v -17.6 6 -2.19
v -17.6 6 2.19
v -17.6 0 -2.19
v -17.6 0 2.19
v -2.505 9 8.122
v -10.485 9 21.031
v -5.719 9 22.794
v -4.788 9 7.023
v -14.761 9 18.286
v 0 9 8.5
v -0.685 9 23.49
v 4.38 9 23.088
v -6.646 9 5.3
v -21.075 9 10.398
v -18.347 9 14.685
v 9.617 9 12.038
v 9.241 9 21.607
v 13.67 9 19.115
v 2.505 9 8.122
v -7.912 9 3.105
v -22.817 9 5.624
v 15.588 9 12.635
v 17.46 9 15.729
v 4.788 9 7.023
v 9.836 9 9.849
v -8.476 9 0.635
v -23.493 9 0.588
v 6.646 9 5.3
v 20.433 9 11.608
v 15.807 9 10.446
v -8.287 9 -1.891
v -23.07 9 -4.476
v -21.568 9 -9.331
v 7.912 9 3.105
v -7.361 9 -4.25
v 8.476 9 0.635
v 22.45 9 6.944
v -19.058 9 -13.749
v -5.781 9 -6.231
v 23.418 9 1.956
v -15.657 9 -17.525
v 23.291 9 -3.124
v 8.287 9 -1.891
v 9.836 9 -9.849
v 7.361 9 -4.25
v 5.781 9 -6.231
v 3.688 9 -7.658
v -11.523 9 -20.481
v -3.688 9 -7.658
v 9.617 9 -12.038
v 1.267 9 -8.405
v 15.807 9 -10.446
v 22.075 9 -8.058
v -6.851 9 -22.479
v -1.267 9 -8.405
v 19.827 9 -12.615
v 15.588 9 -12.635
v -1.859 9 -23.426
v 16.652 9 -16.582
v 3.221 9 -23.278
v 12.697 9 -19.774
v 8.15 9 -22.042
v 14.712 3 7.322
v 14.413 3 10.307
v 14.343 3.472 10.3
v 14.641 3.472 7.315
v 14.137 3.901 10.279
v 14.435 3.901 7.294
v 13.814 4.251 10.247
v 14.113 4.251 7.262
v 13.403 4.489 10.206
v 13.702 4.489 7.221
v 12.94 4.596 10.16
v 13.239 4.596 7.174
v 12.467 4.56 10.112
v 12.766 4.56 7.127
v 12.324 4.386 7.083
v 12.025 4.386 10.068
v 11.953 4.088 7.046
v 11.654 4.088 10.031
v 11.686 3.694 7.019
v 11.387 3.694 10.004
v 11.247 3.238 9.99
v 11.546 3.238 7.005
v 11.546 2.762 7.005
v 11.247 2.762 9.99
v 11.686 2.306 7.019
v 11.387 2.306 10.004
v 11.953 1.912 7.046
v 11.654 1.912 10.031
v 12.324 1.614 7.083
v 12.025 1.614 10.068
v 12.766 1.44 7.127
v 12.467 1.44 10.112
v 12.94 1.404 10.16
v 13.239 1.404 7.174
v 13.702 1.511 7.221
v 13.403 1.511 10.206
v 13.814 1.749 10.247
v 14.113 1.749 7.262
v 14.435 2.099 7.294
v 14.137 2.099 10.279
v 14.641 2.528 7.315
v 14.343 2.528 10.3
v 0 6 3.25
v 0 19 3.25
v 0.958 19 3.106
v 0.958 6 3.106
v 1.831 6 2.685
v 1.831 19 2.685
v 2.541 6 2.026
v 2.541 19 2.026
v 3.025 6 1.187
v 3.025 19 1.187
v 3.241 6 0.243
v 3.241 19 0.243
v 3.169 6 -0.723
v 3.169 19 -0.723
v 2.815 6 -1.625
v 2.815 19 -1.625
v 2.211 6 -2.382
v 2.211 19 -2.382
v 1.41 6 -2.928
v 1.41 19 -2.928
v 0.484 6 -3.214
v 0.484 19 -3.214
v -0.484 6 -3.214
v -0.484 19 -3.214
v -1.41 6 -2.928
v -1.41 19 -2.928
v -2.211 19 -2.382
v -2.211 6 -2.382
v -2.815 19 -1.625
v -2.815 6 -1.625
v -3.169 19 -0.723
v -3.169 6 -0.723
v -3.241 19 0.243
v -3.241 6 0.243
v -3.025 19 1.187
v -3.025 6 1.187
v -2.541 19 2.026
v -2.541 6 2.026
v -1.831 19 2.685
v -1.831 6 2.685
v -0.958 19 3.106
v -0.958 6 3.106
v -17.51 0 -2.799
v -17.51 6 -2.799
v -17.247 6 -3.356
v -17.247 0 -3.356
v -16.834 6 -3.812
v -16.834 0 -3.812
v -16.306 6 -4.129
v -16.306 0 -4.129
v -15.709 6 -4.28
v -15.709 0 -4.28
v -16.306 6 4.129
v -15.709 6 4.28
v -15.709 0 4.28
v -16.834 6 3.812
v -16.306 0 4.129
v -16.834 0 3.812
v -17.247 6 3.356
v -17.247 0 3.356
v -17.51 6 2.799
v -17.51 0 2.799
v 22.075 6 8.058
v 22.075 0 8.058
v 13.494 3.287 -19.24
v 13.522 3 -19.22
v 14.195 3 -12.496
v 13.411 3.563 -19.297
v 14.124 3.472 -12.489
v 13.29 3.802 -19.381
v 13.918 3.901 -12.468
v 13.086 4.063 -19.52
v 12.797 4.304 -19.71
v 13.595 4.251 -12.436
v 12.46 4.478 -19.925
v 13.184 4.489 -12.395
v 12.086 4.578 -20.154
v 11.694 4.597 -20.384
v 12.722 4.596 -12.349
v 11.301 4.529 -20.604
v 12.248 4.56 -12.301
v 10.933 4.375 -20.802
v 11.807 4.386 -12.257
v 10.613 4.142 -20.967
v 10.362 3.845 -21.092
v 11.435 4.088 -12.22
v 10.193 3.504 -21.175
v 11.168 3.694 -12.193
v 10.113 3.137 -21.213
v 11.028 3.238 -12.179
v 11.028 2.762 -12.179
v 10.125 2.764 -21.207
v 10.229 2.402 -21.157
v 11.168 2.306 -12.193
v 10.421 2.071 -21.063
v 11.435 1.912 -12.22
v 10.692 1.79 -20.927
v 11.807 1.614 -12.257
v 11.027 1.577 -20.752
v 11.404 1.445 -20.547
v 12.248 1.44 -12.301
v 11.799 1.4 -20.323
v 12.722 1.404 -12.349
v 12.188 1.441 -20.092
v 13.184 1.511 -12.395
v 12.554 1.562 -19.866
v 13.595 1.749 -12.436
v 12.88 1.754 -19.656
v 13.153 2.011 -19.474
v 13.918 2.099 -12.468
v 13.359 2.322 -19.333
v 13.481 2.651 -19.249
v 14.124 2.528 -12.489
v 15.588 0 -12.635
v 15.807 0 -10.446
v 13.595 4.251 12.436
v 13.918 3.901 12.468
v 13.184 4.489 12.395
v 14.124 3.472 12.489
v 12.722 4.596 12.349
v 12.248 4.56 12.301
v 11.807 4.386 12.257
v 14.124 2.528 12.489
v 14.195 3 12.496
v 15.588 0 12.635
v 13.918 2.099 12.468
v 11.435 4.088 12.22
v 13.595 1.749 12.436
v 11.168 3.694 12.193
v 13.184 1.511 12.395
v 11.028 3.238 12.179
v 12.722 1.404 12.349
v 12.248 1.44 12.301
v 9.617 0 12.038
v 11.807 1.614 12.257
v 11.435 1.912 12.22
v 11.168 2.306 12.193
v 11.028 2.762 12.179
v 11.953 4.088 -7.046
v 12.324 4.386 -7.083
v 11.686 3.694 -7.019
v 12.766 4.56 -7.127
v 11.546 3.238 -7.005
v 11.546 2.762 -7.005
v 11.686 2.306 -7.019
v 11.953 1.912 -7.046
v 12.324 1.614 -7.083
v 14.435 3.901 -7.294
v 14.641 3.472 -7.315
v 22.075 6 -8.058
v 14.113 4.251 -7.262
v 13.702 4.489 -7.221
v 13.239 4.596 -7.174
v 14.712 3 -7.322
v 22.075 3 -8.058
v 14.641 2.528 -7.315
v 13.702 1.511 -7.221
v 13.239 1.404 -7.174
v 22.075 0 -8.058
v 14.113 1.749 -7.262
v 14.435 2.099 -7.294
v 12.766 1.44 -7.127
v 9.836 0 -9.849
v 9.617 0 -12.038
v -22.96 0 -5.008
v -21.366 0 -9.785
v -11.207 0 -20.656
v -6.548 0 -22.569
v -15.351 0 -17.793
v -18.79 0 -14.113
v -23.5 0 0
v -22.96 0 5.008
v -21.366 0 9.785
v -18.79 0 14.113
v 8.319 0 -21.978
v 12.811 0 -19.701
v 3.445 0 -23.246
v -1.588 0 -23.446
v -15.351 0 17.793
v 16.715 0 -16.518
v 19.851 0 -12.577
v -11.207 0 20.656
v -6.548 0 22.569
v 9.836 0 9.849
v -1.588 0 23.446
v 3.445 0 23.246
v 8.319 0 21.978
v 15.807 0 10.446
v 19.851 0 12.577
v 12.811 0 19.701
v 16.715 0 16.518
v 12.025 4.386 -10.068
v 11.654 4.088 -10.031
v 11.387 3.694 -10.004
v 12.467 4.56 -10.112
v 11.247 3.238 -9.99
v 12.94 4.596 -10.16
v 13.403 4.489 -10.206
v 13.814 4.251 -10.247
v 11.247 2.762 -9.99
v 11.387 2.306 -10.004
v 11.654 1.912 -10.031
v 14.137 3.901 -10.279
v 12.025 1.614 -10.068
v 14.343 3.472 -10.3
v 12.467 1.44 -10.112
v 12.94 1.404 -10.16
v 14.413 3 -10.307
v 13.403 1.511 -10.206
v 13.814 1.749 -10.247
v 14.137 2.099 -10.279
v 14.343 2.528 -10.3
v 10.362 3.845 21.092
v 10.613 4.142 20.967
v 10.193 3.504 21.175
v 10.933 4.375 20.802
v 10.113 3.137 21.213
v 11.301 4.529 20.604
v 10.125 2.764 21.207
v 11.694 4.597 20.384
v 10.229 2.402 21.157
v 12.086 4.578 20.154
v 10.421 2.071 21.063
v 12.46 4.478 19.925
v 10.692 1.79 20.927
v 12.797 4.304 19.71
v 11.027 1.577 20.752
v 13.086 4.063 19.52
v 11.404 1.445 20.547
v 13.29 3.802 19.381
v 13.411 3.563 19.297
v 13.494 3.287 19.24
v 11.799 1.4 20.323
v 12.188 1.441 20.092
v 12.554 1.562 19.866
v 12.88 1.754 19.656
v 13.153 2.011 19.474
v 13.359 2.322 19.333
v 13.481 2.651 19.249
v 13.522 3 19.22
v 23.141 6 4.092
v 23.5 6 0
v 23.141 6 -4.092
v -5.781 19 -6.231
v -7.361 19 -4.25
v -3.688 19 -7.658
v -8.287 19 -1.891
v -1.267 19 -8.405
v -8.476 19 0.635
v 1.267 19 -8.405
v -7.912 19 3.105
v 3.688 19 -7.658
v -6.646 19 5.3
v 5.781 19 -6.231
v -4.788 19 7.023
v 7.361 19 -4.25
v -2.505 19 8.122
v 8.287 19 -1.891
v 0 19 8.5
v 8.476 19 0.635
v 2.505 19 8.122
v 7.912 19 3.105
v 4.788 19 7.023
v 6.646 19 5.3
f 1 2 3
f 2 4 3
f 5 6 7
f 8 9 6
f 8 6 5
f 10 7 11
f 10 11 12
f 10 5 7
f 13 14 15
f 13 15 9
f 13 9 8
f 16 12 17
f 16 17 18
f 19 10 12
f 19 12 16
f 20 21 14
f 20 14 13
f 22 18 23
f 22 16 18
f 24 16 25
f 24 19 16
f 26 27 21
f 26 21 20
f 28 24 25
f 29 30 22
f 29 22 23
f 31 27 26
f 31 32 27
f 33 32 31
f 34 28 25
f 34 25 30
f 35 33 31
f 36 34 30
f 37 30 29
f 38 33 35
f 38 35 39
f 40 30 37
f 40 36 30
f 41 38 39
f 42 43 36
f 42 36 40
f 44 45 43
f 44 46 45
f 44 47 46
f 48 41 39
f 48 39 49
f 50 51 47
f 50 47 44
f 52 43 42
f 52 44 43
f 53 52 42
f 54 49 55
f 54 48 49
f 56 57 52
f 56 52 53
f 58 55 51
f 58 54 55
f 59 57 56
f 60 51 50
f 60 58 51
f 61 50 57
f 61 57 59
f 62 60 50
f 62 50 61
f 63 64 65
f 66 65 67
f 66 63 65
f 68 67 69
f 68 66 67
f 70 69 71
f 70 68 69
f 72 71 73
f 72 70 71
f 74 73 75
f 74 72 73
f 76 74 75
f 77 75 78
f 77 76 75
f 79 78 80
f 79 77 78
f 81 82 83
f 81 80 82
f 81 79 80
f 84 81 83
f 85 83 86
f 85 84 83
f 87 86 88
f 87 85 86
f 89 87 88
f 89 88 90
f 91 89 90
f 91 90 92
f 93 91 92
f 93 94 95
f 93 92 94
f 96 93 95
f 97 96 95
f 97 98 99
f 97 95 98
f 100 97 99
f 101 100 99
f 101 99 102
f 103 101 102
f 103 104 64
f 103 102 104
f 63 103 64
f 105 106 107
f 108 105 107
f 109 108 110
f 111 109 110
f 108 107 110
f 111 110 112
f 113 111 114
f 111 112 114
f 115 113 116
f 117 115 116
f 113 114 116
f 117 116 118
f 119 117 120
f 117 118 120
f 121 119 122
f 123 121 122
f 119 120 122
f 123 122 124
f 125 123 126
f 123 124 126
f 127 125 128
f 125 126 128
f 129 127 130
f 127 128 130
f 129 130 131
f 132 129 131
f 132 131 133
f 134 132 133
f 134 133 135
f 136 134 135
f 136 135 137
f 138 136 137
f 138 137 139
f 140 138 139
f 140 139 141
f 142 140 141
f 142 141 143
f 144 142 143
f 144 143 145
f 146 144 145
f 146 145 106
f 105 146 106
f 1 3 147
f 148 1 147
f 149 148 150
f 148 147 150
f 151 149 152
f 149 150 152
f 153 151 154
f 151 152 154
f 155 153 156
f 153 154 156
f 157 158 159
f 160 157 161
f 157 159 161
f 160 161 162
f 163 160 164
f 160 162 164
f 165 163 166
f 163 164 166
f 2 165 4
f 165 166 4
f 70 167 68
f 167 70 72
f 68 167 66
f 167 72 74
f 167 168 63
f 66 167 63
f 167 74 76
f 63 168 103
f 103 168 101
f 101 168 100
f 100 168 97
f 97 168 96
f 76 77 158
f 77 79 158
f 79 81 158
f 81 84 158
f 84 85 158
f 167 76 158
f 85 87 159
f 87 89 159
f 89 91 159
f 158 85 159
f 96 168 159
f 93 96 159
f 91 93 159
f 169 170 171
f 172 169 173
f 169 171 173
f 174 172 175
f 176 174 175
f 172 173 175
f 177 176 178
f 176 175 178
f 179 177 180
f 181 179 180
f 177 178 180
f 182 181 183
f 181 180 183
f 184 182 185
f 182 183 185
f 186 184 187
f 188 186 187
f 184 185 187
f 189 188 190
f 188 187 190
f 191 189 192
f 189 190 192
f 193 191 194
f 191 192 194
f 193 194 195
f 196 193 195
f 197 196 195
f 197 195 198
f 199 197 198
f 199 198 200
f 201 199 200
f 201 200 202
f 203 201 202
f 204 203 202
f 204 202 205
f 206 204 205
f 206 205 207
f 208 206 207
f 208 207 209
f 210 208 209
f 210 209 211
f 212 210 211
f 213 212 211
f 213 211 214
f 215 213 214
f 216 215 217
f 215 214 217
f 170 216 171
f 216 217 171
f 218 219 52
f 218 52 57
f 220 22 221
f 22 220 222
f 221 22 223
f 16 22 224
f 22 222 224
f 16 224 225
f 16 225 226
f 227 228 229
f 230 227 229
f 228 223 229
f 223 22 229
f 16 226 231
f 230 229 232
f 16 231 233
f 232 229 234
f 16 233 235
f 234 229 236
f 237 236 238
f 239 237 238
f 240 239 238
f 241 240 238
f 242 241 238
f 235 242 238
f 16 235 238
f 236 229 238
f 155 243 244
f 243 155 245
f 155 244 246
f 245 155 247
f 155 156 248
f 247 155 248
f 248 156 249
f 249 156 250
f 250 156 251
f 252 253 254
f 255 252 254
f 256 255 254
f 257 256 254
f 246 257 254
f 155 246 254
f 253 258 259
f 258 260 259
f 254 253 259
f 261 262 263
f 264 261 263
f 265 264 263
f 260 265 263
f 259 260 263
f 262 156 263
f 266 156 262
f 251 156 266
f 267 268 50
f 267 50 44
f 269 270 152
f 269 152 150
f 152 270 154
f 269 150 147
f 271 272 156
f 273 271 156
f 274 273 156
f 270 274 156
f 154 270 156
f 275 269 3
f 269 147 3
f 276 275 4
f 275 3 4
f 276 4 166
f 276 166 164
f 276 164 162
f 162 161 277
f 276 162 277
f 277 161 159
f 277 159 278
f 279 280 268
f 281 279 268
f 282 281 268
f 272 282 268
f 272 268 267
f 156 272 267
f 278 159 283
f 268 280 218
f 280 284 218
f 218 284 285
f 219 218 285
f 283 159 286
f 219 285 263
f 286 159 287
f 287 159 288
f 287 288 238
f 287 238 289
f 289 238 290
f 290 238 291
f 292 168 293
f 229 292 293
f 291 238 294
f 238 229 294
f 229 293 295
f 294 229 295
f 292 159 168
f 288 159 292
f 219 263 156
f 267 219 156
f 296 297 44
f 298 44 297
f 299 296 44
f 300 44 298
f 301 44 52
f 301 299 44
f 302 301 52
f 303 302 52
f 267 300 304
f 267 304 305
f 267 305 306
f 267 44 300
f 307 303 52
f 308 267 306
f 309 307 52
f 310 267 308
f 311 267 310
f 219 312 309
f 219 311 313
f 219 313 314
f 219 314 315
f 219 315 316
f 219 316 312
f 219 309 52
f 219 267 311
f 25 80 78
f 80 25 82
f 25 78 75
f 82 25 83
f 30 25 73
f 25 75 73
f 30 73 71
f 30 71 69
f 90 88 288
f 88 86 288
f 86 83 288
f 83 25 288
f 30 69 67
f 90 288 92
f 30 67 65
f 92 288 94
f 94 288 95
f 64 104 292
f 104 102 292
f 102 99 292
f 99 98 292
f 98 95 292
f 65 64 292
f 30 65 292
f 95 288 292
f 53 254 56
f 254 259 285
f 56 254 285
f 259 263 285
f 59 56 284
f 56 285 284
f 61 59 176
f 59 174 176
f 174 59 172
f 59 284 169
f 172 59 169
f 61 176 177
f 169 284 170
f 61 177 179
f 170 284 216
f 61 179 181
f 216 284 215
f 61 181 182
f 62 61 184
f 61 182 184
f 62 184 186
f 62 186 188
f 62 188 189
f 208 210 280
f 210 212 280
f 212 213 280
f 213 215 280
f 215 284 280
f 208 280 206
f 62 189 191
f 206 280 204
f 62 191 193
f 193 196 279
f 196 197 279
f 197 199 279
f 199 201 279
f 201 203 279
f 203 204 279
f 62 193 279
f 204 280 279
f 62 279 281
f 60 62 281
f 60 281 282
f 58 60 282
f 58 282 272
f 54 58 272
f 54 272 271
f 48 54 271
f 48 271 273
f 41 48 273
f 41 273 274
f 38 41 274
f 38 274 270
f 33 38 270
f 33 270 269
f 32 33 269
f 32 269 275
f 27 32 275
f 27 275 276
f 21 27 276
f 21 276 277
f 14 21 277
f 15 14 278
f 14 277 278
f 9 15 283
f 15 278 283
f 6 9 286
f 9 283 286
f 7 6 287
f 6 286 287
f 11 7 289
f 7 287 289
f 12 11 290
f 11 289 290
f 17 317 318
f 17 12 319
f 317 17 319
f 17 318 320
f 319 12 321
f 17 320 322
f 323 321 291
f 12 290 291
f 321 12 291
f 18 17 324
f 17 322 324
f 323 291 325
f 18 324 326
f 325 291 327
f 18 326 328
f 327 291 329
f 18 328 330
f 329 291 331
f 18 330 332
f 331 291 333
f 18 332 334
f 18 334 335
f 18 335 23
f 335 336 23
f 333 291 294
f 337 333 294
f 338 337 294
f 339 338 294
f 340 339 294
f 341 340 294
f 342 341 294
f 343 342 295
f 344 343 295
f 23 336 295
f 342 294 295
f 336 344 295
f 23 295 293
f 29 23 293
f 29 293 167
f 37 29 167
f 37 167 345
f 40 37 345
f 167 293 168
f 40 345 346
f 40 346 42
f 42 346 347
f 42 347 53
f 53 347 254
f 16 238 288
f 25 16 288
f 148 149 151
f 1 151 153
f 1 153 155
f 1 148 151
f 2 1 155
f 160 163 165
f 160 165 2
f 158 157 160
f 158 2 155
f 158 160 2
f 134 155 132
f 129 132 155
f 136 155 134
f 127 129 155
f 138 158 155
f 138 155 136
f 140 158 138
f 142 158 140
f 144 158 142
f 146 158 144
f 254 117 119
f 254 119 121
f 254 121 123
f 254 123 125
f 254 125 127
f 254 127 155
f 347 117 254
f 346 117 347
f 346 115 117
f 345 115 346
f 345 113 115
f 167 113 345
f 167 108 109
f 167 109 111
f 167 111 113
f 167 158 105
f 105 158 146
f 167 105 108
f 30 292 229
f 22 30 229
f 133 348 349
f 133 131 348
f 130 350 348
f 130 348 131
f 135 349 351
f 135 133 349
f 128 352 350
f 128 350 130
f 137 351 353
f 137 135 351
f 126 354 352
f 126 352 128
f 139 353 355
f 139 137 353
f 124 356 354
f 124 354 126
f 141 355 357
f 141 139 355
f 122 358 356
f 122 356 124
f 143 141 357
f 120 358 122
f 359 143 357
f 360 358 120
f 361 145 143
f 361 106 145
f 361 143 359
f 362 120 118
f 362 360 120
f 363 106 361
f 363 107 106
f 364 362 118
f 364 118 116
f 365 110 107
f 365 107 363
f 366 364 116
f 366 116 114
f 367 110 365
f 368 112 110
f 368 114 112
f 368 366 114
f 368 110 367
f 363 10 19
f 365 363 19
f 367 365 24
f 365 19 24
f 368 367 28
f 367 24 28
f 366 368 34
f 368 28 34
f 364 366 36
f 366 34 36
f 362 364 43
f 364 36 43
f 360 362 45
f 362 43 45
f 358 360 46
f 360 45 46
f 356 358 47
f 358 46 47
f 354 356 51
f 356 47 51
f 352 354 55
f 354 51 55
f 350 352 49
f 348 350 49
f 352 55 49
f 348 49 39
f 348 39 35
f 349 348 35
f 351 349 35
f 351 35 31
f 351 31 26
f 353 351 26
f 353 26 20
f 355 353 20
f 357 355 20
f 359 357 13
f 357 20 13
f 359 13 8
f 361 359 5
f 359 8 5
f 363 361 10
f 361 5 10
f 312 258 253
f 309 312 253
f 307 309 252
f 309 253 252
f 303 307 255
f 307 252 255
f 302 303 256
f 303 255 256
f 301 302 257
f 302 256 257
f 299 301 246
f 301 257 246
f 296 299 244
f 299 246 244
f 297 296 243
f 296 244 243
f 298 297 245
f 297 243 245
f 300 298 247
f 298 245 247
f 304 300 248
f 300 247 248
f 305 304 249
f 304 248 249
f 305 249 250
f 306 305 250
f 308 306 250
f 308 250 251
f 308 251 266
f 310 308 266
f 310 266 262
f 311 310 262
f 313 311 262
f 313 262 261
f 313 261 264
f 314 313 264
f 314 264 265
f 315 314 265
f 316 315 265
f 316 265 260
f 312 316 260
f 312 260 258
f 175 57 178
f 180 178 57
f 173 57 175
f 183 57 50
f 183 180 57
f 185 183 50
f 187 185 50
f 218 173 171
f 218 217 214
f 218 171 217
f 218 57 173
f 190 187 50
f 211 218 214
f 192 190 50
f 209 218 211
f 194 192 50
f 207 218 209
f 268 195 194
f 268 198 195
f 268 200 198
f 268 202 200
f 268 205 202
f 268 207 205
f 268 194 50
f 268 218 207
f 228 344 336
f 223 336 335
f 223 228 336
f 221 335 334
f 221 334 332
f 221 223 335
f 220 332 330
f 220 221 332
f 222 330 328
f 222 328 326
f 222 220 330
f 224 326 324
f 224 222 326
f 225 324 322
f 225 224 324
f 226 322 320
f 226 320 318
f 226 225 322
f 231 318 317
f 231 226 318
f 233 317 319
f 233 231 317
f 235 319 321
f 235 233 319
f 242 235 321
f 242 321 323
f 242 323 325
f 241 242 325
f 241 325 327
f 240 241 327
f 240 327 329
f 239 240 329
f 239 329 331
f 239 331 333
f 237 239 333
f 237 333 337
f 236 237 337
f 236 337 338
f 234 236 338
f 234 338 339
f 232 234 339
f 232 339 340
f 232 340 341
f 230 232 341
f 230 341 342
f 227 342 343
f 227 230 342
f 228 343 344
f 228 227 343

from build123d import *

# Parameters (mm, degrees)
SKETCH_1_R          = 23.5
EXTRUDE_1_DEPTH     = 3
CUT_EXTRUDE_1_DEPTH = 3
SKETCH_2_R          = 23.5
EXTRUDE_2_DEPTH     = 6
SKETCH_3_R          = 8.5
EXTRUDE_3_DEPTH     = 10
SKETCH_4_R          = 3.25
CUT_EXTRUDE_2_DEPTH = 19
CUT_EXTRUDE_4_DEPTH = 3
CUT_EXTRUDE_5_DEPTH = 39.281849485
SKETCH_8_R          = 1.6
CUT_EXTRUDE_6_DEPTH = 43.413034161


with BuildPart() as part:
    # Эскиз1 → Бобышка-Вытянуть1 (new body)
    with BuildSketch(Plane(origin=(0, 0, 0), x_dir=(1, 0, 0), z_dir=(0, 1, 0))):
        Circle(SKETCH_1_R)
    extrude(amount=EXTRUDE_1_DEPTH)

    # Эскиз1<4> → Вырез-Вытянуть1 (cut)
    with BuildSketch(Plane(origin=(0, 0, 0), x_dir=(1, 0, 0), z_dir=(0, 1, 0))):
        with BuildLine():
            Line((22.075284758, 8.058027232), (-15.70895781, 4.279602975))
            ThreePointArc((-15.70895781, 4.279602975), (-17.05705032, 3.599136049), (-17.6, 2.190024876))
            Line((-17.6, 2.190024876), (-17.6, -2.190024876))
            ThreePointArc((-17.6, -2.190024876), (-17.05705032, -3.599136049), (-15.70895781, -4.279602975))
            Line((-15.70895781, -4.279602975), (22.075284758, -8.058027232))
            ThreePointArc((22.075284758, -8.058027232), (23.5, 0), (22.075284758, 8.058027232))
        make_face()
    extrude(amount=CUT_EXTRUDE_1_DEPTH, mode=Mode.SUBTRACT)

    # Эскиз2 → Бобышка-Вытянуть2 (add)
    with BuildSketch(Plane(origin=(0, 3, 0), x_dir=(1, 0, 0), z_dir=(0, 1, 0))):
        Circle(SKETCH_2_R)
    extrude(amount=EXTRUDE_2_DEPTH)

    # Эскиз3 → Бобышка-Вытянуть3 (add)
    with BuildSketch(Plane(origin=(0, 9, 0), x_dir=(1, 0, 0), z_dir=(0, 1, 0))):
        Circle(SKETCH_3_R)
    extrude(amount=EXTRUDE_3_DEPTH)

    # Эскиз4 → Вырез-Вытянуть2 (cut)
    with BuildSketch(Plane(origin=(0, 19, 0), x_dir=(1, 0, 0), z_dir=(0, 1, 0))):
        Circle(SKETCH_4_R)
    extrude(amount=-CUT_EXTRUDE_2_DEPTH, mode=Mode.SUBTRACT)

    # Эскиз6 → Вырез-Вытянуть4 (cut)
    with BuildSketch(Plane.XZ.offset(-3)):
        with BuildLine():
            Line((-15.70895781, -4.279602975), (22.075284758, -8.058027232))
            ThreePointArc((22.075284758, -8.058027232), (23.5, 0), (22.075284758, 8.058027232))
            Line((22.075284758, 8.058027232), (-15.70895781, 4.279602975))
            ThreePointArc((-15.70895781, 4.279602975), (-17.05705032, 3.599136049), (-17.6, 2.190024876))
            Line((-17.6, 2.190024876), (-17.6, -2.190024876))
            ThreePointArc((-17.6, -2.190024876), (-17.05705032, -3.599136049), (-15.70895781, -4.279602975))
        make_face()
    extrude(amount=-CUT_EXTRUDE_4_DEPTH, mode=Mode.SUBTRACT)

    # Эскиз7 → Вырез-Вытянуть5 (cut, through all)
    with BuildSketch(Plane.XZ):
        Polygon((9.836327318, 9.849094174), (15.806550459, 10.446116488), (15.587642277, 12.635198307), (9.617419136, 12.038175993), align=None)
        Polygon((9.617419136, -12.038175993), (9.836327318, -9.849094174), (15.806550459, -10.446116488), (15.587642277, -12.635198307), align=None)
    extrude(amount=-CUT_EXTRUDE_5_DEPTH, mode=Mode.SUBTRACT)

    # Эскиз8 → Вырез-Вытянуть6 (cut, through all)
    with BuildSketch(Plane(origin=(-0.579257303, 0, -5.792573026), x_dir=(0.9950371902099893, 0, -0.09950371902099871), z_dir=(0.09950371902099871, 0, 0.9950371902099893))):
        with Locations((13.767532996, 3)):
            Circle(SKETCH_8_R)
    cut_extrude_6 = extrude(amount=-CUT_EXTRUDE_6_DEPTH, mode=Mode.SUBTRACT)

    # Зеркальное отражение1: Вырез-Вытянуть6 across plane
    add(cut_extrude_6.mirror(Plane.XY), mode=Mode.SUBTRACT)


solid = part.part
